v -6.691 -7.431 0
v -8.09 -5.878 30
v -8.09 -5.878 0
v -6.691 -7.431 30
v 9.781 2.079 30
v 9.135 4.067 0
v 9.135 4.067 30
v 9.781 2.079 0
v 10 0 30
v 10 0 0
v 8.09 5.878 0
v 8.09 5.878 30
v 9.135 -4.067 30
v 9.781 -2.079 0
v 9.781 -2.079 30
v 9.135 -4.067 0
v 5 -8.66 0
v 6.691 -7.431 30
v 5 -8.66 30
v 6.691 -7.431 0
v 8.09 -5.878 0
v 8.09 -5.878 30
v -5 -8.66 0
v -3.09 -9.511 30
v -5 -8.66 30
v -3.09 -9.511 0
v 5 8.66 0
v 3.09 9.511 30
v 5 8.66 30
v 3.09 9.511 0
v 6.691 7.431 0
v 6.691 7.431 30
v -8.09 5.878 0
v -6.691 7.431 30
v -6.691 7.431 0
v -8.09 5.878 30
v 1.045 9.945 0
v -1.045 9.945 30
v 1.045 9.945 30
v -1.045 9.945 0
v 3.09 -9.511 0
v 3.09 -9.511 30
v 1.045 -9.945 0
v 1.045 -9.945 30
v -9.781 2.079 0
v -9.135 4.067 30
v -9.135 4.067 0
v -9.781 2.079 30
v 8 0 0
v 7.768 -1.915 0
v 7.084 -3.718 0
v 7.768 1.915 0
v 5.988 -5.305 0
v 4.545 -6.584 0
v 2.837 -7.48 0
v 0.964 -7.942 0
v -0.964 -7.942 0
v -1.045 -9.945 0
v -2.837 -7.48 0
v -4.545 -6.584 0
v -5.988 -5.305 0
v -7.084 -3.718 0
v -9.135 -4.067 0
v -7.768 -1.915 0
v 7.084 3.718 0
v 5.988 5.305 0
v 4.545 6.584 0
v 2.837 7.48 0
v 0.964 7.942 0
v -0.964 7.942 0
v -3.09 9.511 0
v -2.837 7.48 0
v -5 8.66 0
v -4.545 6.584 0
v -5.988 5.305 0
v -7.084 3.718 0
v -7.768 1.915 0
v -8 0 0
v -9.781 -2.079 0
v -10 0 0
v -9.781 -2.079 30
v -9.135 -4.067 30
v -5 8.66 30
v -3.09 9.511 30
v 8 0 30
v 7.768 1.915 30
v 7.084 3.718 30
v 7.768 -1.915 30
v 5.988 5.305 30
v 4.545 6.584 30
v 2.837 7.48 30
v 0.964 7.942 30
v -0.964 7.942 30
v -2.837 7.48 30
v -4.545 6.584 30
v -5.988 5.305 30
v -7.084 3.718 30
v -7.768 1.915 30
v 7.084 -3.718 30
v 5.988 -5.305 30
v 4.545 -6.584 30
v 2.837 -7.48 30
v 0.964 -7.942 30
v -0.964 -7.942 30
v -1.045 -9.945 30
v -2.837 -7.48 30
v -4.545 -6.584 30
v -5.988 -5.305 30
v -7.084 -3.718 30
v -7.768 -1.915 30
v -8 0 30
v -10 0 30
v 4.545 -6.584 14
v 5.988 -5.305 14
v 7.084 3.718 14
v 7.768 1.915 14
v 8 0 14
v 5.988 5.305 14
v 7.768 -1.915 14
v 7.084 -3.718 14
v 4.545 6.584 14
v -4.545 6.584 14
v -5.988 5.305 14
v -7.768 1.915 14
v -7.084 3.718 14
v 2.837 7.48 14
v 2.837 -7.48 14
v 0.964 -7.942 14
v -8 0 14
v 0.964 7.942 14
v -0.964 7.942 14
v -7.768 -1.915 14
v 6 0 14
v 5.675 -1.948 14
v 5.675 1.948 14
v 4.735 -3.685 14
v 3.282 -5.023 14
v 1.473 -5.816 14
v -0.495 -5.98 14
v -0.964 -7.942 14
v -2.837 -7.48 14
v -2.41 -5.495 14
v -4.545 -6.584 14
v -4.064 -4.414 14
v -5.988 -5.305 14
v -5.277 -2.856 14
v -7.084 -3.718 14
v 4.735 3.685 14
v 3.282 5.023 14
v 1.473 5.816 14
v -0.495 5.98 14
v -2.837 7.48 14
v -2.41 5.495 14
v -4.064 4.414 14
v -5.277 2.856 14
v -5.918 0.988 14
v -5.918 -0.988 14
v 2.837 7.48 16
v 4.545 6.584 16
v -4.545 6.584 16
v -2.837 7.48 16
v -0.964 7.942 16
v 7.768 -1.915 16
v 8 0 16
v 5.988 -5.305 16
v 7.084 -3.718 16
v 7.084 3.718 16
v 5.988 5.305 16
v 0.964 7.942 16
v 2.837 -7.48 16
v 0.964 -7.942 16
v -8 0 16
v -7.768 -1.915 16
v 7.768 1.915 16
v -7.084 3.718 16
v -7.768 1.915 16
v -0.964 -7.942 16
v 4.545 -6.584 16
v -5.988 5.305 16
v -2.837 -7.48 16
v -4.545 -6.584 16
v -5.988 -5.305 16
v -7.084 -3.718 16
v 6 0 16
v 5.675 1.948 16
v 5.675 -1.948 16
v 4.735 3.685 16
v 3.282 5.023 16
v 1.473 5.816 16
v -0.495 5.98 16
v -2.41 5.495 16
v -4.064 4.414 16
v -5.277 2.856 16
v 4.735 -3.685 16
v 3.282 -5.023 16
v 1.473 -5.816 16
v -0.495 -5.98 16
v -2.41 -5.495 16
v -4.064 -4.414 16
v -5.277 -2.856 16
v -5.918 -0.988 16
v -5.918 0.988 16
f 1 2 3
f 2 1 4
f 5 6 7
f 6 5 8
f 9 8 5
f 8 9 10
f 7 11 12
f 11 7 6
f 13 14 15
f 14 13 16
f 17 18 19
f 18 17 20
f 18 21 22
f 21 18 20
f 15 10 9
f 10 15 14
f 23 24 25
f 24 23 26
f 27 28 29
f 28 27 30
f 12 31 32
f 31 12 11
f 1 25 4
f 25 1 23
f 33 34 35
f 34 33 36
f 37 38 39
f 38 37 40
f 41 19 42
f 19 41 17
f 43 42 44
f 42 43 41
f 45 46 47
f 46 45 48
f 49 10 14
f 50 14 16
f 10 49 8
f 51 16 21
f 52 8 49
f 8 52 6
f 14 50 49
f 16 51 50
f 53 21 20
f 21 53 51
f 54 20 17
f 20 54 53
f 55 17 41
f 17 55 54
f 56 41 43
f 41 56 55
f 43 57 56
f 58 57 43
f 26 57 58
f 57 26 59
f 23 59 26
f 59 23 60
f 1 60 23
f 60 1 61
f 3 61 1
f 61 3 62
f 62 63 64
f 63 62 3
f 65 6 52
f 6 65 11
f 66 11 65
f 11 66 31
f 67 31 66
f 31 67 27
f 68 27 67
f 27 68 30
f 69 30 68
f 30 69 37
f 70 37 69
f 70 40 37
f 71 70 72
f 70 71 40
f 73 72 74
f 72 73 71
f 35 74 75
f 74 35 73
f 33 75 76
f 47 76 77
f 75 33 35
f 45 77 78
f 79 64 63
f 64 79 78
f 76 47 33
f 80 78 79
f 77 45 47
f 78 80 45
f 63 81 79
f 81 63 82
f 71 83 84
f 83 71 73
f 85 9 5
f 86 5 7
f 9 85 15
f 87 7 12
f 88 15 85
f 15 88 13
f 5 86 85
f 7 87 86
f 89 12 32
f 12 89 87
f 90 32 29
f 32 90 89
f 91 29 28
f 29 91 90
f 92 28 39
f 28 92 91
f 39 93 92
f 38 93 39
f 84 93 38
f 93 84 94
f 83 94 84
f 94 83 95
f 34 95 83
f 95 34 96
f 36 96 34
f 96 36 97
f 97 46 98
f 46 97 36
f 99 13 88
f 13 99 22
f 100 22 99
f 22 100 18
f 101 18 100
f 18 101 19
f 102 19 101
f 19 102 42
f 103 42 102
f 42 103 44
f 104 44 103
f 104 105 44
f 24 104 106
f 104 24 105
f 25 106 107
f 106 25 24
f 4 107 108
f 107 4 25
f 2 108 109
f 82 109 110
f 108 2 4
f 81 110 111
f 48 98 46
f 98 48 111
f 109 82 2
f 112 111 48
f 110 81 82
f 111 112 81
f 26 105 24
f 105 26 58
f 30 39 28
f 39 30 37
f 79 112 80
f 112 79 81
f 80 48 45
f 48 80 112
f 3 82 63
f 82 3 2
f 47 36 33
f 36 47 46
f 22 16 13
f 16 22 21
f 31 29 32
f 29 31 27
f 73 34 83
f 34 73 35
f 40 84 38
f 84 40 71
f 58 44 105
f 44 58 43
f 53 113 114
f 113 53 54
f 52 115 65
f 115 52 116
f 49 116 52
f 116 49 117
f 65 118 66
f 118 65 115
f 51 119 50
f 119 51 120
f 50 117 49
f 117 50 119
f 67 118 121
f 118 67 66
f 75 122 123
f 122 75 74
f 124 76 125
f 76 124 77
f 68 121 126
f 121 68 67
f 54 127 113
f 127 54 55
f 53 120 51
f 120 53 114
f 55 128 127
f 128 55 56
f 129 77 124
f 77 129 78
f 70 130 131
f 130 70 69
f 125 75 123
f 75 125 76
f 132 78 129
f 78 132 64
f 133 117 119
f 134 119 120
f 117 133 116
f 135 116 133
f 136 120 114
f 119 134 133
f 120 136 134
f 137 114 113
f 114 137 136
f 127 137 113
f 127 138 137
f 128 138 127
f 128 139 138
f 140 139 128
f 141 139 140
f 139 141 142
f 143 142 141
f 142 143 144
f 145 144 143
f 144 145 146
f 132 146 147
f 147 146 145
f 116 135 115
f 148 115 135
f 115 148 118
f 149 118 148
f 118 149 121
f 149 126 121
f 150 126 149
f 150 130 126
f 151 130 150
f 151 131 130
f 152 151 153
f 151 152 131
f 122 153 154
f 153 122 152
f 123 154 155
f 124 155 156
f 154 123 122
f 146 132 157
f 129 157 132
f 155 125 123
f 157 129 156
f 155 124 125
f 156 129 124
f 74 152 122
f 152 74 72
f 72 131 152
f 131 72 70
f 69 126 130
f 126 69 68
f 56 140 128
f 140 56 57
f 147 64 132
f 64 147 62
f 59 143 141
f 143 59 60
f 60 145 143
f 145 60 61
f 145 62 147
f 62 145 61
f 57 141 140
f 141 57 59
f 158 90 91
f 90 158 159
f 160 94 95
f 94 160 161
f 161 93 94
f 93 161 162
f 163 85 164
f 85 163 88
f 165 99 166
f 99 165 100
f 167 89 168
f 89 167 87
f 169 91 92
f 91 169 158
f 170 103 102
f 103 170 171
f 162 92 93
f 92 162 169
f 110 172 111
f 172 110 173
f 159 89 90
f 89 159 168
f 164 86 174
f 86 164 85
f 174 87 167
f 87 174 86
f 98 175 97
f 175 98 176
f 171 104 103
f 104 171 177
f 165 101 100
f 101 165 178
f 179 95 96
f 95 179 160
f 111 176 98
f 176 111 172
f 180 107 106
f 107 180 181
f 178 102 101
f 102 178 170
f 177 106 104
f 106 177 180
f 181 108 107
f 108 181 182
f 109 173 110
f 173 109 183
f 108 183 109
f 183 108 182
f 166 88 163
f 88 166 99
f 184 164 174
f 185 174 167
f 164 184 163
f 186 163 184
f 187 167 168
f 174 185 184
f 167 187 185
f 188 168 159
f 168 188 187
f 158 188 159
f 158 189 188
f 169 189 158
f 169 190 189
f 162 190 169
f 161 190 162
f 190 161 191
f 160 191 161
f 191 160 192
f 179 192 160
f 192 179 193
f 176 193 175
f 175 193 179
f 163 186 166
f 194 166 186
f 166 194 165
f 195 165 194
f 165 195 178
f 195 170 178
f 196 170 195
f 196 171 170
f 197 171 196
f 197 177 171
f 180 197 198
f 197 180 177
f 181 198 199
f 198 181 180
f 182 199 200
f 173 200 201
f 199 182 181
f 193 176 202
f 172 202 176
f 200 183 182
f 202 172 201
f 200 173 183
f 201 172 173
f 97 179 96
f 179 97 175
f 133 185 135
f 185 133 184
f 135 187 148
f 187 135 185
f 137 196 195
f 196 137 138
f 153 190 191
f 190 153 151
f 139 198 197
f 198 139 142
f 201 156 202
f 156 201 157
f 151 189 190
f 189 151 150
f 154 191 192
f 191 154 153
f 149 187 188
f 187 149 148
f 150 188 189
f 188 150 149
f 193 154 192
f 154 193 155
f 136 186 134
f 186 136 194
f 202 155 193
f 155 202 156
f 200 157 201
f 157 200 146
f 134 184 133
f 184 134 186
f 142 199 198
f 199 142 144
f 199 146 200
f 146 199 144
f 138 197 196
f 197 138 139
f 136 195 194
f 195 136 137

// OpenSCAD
difference()
{
    cylinder(h=30,r=10);
    translate([0,0,-1])
        cylinder(h=15,r=8);
    translate([0,0,16])
        cylinder(h=15,r=8);
    translate([0,0,13])
        cylinder(h=4,r=6);
}
